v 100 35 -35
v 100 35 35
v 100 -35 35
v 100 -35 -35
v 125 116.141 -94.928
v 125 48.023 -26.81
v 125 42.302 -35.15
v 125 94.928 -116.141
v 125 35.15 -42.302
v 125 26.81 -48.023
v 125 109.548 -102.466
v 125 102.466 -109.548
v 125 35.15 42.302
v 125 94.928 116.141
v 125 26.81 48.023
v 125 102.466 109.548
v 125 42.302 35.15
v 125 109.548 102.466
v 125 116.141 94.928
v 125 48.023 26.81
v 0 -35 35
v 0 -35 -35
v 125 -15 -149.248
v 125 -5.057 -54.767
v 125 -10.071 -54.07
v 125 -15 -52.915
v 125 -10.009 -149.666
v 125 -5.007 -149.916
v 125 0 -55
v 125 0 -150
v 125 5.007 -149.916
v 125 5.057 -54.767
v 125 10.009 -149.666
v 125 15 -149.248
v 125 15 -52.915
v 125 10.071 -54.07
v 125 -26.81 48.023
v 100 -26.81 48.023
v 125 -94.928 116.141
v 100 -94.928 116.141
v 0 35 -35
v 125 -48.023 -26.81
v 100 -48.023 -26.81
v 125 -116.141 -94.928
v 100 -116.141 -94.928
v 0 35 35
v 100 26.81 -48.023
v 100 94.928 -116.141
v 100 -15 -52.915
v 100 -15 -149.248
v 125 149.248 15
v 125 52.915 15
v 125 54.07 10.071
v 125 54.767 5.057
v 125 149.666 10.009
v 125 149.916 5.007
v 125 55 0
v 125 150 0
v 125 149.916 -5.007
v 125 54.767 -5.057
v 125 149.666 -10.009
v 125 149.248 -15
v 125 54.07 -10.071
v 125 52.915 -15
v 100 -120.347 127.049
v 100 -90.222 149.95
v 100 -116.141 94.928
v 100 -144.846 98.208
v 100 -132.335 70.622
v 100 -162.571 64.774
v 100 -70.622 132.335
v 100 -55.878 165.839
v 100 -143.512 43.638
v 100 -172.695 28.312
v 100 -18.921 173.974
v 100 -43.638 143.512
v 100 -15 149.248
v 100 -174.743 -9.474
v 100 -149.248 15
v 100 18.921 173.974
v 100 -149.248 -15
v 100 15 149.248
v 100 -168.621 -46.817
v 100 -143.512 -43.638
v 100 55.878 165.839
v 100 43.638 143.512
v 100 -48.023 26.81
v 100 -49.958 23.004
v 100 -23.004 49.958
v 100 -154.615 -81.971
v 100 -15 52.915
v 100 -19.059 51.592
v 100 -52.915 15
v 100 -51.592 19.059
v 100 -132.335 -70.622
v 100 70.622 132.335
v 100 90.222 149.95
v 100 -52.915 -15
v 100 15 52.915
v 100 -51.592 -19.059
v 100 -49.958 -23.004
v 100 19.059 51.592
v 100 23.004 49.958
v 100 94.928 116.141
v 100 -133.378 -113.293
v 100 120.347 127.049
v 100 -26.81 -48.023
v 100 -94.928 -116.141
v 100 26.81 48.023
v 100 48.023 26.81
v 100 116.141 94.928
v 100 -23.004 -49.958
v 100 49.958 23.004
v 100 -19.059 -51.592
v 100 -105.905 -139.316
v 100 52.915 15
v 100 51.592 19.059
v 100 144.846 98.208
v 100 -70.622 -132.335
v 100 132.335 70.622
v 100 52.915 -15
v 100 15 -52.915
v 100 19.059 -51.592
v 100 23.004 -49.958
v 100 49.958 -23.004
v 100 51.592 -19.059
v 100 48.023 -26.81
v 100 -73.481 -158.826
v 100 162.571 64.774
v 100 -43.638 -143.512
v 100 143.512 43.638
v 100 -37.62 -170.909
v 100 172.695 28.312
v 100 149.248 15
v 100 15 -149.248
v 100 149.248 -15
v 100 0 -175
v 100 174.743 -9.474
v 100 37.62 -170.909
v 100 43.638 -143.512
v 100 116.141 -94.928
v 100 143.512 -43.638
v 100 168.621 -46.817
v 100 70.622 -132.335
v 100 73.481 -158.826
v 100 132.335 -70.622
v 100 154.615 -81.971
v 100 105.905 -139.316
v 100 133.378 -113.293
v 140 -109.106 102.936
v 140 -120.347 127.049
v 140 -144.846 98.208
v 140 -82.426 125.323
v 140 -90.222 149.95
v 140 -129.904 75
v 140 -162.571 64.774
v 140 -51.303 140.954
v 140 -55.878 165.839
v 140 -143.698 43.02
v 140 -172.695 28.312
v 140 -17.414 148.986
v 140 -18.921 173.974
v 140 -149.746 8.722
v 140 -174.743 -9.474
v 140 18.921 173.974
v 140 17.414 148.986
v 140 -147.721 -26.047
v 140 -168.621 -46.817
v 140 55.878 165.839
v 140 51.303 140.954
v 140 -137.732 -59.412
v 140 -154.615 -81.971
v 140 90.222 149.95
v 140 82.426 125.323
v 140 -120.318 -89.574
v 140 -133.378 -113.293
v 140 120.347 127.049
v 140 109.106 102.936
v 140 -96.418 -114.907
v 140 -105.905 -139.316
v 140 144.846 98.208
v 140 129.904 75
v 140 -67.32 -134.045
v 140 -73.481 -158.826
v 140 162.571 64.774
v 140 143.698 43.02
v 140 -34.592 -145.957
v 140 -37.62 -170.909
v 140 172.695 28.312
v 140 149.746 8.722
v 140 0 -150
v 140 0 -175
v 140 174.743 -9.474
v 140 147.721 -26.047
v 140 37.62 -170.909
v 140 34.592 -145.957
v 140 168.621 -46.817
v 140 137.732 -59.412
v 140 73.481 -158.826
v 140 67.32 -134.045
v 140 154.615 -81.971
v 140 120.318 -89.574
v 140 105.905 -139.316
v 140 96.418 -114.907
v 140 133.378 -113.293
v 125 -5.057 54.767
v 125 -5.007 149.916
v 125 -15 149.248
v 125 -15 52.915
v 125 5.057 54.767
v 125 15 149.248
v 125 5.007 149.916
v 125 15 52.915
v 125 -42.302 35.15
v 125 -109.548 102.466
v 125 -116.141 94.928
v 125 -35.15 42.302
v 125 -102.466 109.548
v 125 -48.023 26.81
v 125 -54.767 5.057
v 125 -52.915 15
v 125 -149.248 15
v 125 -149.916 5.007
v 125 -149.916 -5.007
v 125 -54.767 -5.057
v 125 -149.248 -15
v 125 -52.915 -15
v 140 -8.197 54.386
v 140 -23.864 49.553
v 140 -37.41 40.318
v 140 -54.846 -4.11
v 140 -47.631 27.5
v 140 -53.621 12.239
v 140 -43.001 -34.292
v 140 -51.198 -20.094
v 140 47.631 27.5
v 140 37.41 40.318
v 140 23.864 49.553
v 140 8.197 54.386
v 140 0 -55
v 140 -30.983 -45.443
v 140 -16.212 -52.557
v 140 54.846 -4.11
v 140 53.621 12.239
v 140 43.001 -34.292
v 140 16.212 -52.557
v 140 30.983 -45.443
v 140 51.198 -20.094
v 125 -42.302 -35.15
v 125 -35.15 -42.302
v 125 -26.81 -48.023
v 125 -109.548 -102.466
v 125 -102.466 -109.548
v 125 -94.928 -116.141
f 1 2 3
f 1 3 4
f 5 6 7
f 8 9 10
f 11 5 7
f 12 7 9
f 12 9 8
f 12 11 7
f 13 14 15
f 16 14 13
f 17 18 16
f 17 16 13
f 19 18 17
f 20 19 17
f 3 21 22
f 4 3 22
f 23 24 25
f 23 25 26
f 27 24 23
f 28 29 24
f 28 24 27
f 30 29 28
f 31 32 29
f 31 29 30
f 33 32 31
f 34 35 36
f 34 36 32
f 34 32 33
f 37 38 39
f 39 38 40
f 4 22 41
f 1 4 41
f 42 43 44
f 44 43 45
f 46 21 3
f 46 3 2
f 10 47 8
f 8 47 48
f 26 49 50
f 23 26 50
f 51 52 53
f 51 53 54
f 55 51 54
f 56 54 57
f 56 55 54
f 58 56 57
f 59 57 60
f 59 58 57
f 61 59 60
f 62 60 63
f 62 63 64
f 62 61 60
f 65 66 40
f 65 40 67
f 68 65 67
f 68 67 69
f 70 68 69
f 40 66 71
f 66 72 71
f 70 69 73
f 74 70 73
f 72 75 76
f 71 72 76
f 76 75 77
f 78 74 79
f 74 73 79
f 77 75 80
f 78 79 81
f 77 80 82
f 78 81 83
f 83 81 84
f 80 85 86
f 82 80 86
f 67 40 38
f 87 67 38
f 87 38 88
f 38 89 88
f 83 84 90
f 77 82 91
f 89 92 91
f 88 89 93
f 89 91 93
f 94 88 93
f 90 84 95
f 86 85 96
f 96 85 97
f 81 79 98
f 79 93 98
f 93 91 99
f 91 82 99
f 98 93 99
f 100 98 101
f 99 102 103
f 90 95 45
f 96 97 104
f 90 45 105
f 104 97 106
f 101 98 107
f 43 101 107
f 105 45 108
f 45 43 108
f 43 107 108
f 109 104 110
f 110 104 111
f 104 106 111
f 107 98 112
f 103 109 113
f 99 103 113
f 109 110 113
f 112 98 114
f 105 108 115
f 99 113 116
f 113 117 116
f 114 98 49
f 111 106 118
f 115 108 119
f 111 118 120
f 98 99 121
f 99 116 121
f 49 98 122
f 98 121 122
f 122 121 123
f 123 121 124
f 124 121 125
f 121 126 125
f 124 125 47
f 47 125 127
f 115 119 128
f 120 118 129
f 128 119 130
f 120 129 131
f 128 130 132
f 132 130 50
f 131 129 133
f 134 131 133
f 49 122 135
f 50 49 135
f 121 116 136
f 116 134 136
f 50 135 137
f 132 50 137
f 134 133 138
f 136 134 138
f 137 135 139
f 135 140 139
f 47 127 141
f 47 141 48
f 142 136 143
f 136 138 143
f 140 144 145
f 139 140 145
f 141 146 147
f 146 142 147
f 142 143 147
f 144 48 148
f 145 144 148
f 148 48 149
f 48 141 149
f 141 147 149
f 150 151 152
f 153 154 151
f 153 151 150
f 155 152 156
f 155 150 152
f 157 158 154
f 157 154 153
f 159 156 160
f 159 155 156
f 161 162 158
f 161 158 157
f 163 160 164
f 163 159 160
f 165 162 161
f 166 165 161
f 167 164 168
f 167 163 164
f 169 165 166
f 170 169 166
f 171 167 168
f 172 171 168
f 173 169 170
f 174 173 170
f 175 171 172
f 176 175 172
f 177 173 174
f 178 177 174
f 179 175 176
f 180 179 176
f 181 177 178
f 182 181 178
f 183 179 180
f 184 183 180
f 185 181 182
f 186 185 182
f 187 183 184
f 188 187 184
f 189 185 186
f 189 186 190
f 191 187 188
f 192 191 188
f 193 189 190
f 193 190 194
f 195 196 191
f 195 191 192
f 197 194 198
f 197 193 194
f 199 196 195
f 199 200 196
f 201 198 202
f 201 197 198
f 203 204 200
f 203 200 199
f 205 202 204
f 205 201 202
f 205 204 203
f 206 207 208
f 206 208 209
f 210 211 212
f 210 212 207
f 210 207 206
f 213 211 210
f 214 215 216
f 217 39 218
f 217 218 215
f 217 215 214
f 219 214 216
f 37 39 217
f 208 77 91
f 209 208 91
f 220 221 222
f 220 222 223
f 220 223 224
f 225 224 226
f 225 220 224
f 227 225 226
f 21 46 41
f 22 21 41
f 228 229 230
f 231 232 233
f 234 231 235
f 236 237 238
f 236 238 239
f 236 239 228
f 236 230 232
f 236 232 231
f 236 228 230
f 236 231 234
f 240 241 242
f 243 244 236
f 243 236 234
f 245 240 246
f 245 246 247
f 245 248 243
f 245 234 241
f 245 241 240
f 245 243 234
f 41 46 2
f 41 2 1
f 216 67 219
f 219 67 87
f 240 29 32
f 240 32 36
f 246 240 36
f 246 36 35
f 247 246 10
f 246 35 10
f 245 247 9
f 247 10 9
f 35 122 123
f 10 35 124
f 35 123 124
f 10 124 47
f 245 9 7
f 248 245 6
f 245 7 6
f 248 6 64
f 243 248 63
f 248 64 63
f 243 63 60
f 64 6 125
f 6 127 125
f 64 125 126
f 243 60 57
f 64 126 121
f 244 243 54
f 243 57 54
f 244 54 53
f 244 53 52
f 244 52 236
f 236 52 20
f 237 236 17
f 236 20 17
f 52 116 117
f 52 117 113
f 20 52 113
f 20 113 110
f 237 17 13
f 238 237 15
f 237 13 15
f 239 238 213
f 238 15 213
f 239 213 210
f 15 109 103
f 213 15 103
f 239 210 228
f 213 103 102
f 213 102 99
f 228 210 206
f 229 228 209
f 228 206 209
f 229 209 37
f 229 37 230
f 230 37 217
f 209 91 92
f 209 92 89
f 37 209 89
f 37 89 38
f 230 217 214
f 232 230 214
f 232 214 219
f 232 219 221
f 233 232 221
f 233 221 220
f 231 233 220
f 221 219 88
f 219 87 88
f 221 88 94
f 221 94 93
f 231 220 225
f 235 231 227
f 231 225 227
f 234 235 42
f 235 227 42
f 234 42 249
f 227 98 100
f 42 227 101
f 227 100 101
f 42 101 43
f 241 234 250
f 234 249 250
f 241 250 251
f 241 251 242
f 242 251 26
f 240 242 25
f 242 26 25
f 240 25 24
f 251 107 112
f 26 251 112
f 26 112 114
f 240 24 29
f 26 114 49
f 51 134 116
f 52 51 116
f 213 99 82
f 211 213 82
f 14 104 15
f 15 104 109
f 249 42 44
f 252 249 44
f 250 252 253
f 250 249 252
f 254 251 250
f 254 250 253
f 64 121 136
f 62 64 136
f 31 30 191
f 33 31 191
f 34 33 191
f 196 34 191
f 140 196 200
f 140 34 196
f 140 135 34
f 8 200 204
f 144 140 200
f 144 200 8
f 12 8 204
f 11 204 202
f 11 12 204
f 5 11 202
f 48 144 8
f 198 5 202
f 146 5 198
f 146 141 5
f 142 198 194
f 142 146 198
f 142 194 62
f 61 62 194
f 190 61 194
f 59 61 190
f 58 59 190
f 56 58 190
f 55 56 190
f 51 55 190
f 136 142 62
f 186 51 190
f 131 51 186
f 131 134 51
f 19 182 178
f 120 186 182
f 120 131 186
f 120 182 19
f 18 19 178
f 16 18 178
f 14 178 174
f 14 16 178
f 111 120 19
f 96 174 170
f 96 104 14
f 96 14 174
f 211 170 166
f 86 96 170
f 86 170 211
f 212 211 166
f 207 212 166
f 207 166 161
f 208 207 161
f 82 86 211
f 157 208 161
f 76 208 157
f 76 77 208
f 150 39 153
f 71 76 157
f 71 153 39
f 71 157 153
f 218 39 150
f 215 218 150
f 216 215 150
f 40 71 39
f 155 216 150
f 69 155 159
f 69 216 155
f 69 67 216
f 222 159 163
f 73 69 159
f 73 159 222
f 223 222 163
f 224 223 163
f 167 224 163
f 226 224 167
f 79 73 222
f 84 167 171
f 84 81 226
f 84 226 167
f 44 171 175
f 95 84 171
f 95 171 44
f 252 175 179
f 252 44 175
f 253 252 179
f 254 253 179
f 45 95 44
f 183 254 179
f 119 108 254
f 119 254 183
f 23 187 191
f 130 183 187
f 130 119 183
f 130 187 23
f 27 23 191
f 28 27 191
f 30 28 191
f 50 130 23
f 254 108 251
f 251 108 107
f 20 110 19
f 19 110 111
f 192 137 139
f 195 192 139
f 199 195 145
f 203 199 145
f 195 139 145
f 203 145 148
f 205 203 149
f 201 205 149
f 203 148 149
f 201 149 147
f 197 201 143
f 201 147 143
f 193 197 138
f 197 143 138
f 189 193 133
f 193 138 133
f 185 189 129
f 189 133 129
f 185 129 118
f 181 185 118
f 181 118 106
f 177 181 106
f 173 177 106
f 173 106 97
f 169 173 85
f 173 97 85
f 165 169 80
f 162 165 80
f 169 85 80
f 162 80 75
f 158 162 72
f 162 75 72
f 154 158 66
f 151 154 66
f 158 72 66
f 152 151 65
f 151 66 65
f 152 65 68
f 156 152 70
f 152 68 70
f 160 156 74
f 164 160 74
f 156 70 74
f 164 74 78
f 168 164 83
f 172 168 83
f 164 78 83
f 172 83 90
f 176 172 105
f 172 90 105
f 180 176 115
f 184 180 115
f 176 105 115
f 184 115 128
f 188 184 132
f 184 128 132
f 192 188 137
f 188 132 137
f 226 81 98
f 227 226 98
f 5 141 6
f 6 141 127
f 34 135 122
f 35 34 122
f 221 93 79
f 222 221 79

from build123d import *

# Parameters (mm, degrees)
ESQUISSE1_W          = 70
ESQUISSE1_H          = 70
BOSS_EXTRU_1_DEPTH   = 100
ESQUISSE2_R          = 55
BOSS_EXTRU_2_DEPTH   = 40
ESQUISSE2_R_2        = 175
ESQUISSE2_R_3        = 150
BOSS_EXTRU_2_2_DEPTH = 40
BOSS_EXTRU_3_DEPTH   = 25


with BuildPart() as part:
    # Esquisse1 → Boss.-Extru.1 (new body)
    with BuildSketch(Plane(origin=(0, 0, 0), x_dir=(0, 0, -1), z_dir=(1, 0, 0))):
        Rectangle(ESQUISSE1_W, ESQUISSE1_H)
    extrude(amount=BOSS_EXTRU_1_DEPTH)


with BuildPart() as body_2:
    # Esquisse2 → Boss.-Extru.2 (new body)
    with BuildSketch(Plane(origin=(100, 0, 0), x_dir=(0, 0, -1), z_dir=(1, 0, 0))):
        Circle(ESQUISSE2_R)
    extrude(amount=BOSS_EXTRU_2_DEPTH)



with BuildPart() as body_3:
    # Esquisse2 → Boss.-Extru.2 2 (new body)
    with BuildSketch(Plane(origin=(100, 0, 0), x_dir=(0, 0, -1), z_dir=(1, 0, 0))):
        Circle(ESQUISSE2_R_2)
        Circle(ESQUISSE2_R_3, mode=Mode.SUBTRACT)
    extrude(amount=BOSS_EXTRU_2_2_DEPTH)


with BuildPart() as body_2_1:
    add(body_2.part)

    add(body_3.part)  # Boss.-Extru.3 merges body 3
    # Esquisse2<3> → Boss.-Extru.3 (add)
    with BuildSketch(Plane(origin=(100, 0, 0), x_dir=(0, 0, -1), z_dir=(1, 0, 0))):
        with BuildLine():
            ThreePointArc((-15, 52.915026221), (0, 55), (15, 52.915026221))
            Line((15, 52.915026221), (15, 149.248115566))
            ThreePointArc((15, 149.248115566), (0, 150), (-15, 149.248115566))
            Line((-15, 149.248115566), (-15, 52.915026221))
        make_face()
        with BuildLine():
            Line((94.927752878, 116.140956314), (26.80997215, 48.023175586))
            ThreePointArc((26.80997215, 48.023175586), (38.890872965, 38.890872965), (48.023175586, 26.80997215))
            Line((48.023175586, 26.80997215), (116.140956314, 94.927752878))
            ThreePointArc((116.140956314, 94.927752878), (106.066017178, 106.066017178), (94.927752878, 116.140956314))
        make_face()
        with BuildLine():
            ThreePointArc((-48.023175586, 26.80997215), (-38.890872965, 38.890872965), (-26.80997215, 48.023175586))
            Line((-26.80997215, 48.023175586), (-94.927752878, 116.140956314))
            ThreePointArc((-94.927752878, 116.140956314), (-106.066017178, 106.066017178), (-116.140956314, 94.927752878))
            Line((-116.140956314, 94.927752878), (-48.023175586, 26.80997215))
        make_face()
        with BuildLine():
            Line((149.248115566, 15), (52.915026221, 15))
            ThreePointArc((52.915026221, 15), (55, 0), (52.915026221, -15))
            Line((52.915026221, -15), (149.248115566, -15))
            ThreePointArc((149.248115566, -15), (150, 0), (149.248115566, 15))
        make_face()
        with BuildLine():
            ThreePointArc((-52.915026221, -15), (-55, 0), (-52.915026221, 15))
            Line((-52.915026221, 15), (-149.248115566, 15))
            ThreePointArc((-149.248115566, 15), (-150, 0), (-149.248115566, -15))
            Line((-149.248115566, -15), (-52.915026221, -15))
        make_face()
        with BuildLine():
            ThreePointArc((-26.80997215, -48.023175586), (-38.890872965, -38.890872965), (-48.023175586, -26.80997215))
            Line((-48.023175586, -26.80997215), (-116.140956314, -94.927752878))
            ThreePointArc((-116.140956314, -94.927752878), (-106.066017178, -106.066017178), (-94.927752878, -116.140956314))
            Line((-94.927752878, -116.140956314), (-26.80997215, -48.023175586))
        make_face()
        with BuildLine():
            Line((116.140956314, -94.927752878), (48.023175586, -26.80997215))
            ThreePointArc((48.023175586, -26.80997215), (38.890872965, -38.890872965), (26.80997215, -48.023175586))
            Line((26.80997215, -48.023175586), (94.927752878, -116.140956314))
            ThreePointArc((94.927752878, -116.140956314), (106.066017178, -106.066017178), (116.140956314, -94.927752878))
        make_face()
        with BuildLine():
            ThreePointArc((15, -52.915026221), (0, -55), (-15, -52.915026221))
            Line((-15, -52.915026221), (-15, -149.248115566))
            ThreePointArc((-15, -149.248115566), (0, -150), (15, -149.248115566))
            Line((15, -149.248115566), (15, -52.915026221))
        make_face()
    extrude(amount=BOSS_EXTRU_3_DEPTH)


solid = Compound([part.part, body_2_1.part])
